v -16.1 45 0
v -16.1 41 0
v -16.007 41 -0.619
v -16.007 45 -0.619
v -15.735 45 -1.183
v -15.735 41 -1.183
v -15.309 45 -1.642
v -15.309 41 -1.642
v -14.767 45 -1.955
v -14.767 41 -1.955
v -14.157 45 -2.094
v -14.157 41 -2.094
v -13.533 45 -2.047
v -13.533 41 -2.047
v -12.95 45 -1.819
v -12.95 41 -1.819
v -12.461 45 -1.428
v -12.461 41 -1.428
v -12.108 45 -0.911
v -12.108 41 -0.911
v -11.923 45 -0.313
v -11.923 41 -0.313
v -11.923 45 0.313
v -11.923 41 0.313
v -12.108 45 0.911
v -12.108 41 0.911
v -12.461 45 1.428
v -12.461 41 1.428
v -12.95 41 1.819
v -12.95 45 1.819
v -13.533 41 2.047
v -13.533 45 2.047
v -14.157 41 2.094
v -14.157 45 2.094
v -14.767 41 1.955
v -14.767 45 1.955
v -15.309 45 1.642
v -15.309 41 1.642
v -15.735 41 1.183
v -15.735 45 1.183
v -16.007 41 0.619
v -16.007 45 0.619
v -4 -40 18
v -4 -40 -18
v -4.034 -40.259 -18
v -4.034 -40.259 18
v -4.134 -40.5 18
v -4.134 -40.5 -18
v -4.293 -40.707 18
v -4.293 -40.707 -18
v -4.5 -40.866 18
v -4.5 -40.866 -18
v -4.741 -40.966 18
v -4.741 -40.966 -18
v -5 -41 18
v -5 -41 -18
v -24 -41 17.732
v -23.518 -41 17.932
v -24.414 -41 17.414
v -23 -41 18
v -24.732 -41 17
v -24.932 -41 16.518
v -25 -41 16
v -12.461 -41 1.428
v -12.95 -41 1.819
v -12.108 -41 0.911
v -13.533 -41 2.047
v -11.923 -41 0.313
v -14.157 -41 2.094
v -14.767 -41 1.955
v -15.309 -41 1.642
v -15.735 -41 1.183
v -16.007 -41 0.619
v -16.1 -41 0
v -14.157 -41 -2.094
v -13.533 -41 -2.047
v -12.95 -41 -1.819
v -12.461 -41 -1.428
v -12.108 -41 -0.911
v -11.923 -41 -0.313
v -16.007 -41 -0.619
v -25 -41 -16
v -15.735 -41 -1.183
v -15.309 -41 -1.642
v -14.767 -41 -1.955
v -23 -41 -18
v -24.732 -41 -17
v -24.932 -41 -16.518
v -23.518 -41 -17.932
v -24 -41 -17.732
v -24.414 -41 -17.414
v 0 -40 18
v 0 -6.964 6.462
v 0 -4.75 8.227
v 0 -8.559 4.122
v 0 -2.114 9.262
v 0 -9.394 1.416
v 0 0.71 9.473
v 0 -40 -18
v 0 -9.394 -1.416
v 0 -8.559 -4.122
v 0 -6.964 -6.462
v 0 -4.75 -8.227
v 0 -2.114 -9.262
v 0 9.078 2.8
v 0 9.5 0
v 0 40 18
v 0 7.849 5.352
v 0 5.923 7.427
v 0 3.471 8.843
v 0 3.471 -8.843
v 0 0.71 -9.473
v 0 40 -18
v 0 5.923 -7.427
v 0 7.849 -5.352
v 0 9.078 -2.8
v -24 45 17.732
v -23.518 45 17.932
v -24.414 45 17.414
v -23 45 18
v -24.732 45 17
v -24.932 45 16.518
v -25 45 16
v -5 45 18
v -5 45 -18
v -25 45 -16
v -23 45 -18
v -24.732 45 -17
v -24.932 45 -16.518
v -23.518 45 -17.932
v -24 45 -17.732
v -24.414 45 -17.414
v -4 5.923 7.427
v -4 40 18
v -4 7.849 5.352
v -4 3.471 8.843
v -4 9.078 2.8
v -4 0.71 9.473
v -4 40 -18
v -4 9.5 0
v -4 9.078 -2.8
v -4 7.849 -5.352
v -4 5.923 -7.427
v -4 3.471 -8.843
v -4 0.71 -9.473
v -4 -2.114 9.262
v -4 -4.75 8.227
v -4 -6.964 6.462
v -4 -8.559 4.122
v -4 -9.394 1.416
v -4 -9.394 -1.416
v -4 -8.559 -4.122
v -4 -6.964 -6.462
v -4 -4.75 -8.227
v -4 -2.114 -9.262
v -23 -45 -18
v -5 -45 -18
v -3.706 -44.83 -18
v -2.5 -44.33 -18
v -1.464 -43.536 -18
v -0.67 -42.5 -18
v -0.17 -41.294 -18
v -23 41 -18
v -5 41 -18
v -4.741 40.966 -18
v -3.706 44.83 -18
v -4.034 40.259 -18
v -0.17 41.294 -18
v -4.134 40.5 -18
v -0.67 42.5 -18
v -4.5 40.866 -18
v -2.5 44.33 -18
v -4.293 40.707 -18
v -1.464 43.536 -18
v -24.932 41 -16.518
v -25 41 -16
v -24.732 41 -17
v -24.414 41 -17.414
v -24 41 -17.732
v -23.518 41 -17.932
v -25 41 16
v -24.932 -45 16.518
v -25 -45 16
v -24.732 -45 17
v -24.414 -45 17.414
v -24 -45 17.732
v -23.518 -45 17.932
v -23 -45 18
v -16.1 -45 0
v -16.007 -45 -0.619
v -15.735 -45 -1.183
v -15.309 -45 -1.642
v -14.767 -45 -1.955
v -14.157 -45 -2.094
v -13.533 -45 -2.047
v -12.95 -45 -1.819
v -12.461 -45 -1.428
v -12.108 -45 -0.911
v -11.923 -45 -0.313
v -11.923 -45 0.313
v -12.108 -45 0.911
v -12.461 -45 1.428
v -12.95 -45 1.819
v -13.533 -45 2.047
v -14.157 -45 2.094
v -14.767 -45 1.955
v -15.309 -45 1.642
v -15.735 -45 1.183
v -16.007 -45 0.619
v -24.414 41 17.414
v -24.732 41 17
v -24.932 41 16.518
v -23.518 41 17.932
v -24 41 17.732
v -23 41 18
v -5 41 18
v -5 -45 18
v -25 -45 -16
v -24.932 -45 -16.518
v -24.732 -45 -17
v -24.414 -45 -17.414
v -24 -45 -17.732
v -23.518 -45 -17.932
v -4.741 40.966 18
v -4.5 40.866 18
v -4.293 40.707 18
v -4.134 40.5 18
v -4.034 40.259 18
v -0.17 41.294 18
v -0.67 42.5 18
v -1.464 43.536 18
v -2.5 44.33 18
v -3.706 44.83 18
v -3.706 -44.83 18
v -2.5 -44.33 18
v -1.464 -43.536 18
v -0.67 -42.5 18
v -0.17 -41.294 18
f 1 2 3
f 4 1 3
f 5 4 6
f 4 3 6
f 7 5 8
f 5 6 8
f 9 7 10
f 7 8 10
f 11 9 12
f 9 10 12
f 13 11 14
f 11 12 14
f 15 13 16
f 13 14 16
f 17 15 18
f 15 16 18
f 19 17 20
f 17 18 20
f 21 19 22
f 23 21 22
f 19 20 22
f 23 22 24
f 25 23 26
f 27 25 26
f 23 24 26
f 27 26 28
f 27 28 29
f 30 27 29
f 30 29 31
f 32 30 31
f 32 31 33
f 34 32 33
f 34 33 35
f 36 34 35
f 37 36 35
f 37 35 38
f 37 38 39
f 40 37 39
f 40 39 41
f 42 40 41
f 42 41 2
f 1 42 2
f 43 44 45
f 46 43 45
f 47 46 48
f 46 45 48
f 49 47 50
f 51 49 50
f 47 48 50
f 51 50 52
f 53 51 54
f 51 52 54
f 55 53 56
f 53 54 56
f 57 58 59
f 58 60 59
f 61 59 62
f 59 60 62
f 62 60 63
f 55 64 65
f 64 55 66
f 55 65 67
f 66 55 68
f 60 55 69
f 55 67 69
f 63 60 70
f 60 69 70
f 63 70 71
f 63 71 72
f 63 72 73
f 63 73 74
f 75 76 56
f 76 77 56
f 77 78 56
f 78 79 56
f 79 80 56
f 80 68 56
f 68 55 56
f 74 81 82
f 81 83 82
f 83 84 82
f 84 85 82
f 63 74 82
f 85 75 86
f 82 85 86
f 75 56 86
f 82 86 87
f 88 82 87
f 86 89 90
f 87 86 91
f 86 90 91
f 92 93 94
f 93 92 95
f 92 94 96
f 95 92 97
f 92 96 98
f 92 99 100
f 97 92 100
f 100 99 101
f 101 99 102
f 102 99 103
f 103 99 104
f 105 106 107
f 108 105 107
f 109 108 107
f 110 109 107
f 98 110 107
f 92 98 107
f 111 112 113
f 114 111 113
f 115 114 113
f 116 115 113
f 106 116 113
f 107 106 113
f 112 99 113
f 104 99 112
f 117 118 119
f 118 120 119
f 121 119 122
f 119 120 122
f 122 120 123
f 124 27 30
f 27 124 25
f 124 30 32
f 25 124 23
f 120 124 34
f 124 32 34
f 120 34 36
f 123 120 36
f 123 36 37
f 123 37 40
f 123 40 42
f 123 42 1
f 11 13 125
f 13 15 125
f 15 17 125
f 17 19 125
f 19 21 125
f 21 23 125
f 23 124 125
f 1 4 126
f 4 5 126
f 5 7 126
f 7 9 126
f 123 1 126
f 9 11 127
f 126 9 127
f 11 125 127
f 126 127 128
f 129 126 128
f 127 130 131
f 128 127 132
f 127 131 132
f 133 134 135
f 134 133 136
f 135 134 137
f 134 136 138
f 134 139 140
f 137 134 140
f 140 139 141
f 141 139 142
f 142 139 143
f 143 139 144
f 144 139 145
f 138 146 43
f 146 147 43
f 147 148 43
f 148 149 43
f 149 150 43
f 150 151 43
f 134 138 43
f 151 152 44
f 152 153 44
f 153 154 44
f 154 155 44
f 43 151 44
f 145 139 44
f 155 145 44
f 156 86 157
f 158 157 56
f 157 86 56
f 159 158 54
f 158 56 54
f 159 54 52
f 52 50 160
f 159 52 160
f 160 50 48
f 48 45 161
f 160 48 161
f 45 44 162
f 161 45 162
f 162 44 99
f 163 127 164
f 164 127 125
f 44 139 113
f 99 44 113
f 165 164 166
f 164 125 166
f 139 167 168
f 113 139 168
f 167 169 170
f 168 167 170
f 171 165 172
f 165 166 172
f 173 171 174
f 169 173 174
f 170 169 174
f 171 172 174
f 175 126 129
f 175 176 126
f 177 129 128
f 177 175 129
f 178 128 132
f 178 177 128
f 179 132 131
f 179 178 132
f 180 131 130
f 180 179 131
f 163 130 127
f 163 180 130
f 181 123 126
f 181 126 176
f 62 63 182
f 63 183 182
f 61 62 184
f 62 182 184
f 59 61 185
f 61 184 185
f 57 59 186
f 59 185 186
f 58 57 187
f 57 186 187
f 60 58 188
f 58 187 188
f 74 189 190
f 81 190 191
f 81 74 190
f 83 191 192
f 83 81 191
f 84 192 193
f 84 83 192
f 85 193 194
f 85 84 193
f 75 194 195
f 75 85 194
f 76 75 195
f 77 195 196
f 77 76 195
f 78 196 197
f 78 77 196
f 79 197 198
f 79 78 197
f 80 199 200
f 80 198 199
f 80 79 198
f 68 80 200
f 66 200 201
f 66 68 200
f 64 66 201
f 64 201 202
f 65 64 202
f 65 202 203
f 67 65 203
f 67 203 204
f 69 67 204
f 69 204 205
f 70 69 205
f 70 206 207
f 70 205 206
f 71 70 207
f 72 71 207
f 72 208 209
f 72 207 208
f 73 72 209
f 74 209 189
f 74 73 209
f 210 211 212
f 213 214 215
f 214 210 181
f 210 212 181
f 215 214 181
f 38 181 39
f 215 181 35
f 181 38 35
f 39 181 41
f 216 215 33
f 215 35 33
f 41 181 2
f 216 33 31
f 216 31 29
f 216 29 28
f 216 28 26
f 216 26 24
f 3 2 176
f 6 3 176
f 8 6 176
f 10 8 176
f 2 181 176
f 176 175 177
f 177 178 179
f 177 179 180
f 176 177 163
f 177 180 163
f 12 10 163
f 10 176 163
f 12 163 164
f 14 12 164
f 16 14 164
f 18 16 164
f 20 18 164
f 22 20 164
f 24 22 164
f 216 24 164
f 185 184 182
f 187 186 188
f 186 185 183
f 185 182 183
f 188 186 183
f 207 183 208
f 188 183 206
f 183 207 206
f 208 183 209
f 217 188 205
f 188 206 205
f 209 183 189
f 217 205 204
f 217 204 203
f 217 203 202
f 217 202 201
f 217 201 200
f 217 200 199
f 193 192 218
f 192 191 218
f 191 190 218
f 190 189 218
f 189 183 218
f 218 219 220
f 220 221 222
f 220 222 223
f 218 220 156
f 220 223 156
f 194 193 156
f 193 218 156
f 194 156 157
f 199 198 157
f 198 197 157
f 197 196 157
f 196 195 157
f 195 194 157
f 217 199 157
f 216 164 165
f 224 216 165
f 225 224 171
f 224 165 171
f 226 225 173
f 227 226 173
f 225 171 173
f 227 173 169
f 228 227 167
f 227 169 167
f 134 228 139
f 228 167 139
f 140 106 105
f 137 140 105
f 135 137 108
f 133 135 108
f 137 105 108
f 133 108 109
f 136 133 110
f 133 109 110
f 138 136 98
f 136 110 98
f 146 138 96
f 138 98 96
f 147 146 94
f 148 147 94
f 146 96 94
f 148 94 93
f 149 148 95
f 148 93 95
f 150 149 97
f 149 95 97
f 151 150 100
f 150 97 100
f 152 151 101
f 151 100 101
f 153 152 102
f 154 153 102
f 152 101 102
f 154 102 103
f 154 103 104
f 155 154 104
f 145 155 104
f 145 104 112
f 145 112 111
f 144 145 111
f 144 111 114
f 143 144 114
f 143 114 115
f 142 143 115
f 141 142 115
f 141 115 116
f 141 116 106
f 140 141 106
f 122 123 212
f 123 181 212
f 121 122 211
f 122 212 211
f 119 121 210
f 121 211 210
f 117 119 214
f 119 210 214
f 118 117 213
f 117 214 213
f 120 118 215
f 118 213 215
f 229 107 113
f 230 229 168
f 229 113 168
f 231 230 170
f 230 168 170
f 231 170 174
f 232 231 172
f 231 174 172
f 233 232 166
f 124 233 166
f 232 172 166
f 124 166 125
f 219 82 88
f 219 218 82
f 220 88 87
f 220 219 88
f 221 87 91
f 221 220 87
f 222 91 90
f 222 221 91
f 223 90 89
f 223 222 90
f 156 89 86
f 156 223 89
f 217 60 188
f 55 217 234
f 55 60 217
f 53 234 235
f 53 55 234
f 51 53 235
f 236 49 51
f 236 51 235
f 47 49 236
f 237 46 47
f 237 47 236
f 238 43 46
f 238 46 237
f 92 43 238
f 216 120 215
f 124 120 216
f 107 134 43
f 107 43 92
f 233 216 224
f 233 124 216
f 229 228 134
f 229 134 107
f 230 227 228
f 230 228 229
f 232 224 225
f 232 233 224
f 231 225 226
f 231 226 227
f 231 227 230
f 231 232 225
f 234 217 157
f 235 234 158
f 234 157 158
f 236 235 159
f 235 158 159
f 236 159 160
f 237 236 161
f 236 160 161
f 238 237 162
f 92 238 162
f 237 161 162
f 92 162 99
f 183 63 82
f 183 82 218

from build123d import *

# Parameters (mm, degrees)
BASE_FLANGE1_START    = -18
BASE_FLANGE1_DEPTH    = 36
FILLET1_R             = 2
M5_TAPPED_HOLE1_D     = 4.2
M5_TAPPED_HOLE1_DEPTH = 4
SKETCH8_R             = 9.5
CUT_EXTRUDE1_DEPTH    = 55.534392818


# Read off the part's stored shape, not the designer's step: Base-Flange1
with BuildPart() as part:
    # Base-Flange1 outline → Base-Flange1 (new body)
    with BuildSketch(Plane.XY.offset(BASE_FLANGE1_START)):
        with BuildLine():
            Line((-5, 45), (-25, 45))
            Line((-25, 45), (-25, 41))
            Line((-25, 41), (-5, 41))
            ThreePointArc((-5, 41), (-4.292893219, 40.707106781), (-4, 40))
            Line((-4, 40), (-4, -40))
            ThreePointArc((-4, -40), (-4.292893219, -40.707106781), (-5, -41))
            Line((-5, -41), (-25, -41))
            Line((-25, -41), (-25, -45))
            Line((-25, -45), (-5, -45))
            ThreePointArc((-5, -45), (-1.464466094, -43.535533906), (0, -40))
            Line((0, -40), (0, 40))
            ThreePointArc((0, 40), (-1.464466094, 43.535533906), (-5, 45))
        make_face()
    extrude(amount=BASE_FLANGE1_DEPTH)

    # Fillet1
    fillet1_edges = [part.edges().sort_by_distance(p)[0] for p in [
        (-25, -43, -18),
        (-25, 43, -18),
        (-25, -43, 18),
        (-25, 43, 18),
    ]]
    fillet(fillet1_edges, radius=FILLET1_R)

    # M5 Tapped Hole1
    with Locations(Plane(origin=(0, 45, 0), x_dir=(1, 0, 0), z_dir=(0, 1, 0))):
        with Locations((-14, 0)):
            m5_tapped_hole1 = Hole(M5_TAPPED_HOLE1_D / 2, depth=M5_TAPPED_HOLE1_DEPTH)

    # Mirror1: M5 Tapped Hole1 across plane
    add(m5_tapped_hole1.mirror(Plane.ZX), mode=Mode.SUBTRACT)

    # Sketch8 → Cut-Extrude1 (cut, through all)
    with BuildSketch(Plane(origin=(0, 0, 0), x_dir=(0, 0, -1), z_dir=(1, 0, 0))):
        with Locations(Location((0, 0, 0), (0, 0, 90))):
            Circle(SKETCH8_R)
    extrude(amount=-CUT_EXTRUDE1_DEPTH, mode=Mode.SUBTRACT)


solid = part.part
